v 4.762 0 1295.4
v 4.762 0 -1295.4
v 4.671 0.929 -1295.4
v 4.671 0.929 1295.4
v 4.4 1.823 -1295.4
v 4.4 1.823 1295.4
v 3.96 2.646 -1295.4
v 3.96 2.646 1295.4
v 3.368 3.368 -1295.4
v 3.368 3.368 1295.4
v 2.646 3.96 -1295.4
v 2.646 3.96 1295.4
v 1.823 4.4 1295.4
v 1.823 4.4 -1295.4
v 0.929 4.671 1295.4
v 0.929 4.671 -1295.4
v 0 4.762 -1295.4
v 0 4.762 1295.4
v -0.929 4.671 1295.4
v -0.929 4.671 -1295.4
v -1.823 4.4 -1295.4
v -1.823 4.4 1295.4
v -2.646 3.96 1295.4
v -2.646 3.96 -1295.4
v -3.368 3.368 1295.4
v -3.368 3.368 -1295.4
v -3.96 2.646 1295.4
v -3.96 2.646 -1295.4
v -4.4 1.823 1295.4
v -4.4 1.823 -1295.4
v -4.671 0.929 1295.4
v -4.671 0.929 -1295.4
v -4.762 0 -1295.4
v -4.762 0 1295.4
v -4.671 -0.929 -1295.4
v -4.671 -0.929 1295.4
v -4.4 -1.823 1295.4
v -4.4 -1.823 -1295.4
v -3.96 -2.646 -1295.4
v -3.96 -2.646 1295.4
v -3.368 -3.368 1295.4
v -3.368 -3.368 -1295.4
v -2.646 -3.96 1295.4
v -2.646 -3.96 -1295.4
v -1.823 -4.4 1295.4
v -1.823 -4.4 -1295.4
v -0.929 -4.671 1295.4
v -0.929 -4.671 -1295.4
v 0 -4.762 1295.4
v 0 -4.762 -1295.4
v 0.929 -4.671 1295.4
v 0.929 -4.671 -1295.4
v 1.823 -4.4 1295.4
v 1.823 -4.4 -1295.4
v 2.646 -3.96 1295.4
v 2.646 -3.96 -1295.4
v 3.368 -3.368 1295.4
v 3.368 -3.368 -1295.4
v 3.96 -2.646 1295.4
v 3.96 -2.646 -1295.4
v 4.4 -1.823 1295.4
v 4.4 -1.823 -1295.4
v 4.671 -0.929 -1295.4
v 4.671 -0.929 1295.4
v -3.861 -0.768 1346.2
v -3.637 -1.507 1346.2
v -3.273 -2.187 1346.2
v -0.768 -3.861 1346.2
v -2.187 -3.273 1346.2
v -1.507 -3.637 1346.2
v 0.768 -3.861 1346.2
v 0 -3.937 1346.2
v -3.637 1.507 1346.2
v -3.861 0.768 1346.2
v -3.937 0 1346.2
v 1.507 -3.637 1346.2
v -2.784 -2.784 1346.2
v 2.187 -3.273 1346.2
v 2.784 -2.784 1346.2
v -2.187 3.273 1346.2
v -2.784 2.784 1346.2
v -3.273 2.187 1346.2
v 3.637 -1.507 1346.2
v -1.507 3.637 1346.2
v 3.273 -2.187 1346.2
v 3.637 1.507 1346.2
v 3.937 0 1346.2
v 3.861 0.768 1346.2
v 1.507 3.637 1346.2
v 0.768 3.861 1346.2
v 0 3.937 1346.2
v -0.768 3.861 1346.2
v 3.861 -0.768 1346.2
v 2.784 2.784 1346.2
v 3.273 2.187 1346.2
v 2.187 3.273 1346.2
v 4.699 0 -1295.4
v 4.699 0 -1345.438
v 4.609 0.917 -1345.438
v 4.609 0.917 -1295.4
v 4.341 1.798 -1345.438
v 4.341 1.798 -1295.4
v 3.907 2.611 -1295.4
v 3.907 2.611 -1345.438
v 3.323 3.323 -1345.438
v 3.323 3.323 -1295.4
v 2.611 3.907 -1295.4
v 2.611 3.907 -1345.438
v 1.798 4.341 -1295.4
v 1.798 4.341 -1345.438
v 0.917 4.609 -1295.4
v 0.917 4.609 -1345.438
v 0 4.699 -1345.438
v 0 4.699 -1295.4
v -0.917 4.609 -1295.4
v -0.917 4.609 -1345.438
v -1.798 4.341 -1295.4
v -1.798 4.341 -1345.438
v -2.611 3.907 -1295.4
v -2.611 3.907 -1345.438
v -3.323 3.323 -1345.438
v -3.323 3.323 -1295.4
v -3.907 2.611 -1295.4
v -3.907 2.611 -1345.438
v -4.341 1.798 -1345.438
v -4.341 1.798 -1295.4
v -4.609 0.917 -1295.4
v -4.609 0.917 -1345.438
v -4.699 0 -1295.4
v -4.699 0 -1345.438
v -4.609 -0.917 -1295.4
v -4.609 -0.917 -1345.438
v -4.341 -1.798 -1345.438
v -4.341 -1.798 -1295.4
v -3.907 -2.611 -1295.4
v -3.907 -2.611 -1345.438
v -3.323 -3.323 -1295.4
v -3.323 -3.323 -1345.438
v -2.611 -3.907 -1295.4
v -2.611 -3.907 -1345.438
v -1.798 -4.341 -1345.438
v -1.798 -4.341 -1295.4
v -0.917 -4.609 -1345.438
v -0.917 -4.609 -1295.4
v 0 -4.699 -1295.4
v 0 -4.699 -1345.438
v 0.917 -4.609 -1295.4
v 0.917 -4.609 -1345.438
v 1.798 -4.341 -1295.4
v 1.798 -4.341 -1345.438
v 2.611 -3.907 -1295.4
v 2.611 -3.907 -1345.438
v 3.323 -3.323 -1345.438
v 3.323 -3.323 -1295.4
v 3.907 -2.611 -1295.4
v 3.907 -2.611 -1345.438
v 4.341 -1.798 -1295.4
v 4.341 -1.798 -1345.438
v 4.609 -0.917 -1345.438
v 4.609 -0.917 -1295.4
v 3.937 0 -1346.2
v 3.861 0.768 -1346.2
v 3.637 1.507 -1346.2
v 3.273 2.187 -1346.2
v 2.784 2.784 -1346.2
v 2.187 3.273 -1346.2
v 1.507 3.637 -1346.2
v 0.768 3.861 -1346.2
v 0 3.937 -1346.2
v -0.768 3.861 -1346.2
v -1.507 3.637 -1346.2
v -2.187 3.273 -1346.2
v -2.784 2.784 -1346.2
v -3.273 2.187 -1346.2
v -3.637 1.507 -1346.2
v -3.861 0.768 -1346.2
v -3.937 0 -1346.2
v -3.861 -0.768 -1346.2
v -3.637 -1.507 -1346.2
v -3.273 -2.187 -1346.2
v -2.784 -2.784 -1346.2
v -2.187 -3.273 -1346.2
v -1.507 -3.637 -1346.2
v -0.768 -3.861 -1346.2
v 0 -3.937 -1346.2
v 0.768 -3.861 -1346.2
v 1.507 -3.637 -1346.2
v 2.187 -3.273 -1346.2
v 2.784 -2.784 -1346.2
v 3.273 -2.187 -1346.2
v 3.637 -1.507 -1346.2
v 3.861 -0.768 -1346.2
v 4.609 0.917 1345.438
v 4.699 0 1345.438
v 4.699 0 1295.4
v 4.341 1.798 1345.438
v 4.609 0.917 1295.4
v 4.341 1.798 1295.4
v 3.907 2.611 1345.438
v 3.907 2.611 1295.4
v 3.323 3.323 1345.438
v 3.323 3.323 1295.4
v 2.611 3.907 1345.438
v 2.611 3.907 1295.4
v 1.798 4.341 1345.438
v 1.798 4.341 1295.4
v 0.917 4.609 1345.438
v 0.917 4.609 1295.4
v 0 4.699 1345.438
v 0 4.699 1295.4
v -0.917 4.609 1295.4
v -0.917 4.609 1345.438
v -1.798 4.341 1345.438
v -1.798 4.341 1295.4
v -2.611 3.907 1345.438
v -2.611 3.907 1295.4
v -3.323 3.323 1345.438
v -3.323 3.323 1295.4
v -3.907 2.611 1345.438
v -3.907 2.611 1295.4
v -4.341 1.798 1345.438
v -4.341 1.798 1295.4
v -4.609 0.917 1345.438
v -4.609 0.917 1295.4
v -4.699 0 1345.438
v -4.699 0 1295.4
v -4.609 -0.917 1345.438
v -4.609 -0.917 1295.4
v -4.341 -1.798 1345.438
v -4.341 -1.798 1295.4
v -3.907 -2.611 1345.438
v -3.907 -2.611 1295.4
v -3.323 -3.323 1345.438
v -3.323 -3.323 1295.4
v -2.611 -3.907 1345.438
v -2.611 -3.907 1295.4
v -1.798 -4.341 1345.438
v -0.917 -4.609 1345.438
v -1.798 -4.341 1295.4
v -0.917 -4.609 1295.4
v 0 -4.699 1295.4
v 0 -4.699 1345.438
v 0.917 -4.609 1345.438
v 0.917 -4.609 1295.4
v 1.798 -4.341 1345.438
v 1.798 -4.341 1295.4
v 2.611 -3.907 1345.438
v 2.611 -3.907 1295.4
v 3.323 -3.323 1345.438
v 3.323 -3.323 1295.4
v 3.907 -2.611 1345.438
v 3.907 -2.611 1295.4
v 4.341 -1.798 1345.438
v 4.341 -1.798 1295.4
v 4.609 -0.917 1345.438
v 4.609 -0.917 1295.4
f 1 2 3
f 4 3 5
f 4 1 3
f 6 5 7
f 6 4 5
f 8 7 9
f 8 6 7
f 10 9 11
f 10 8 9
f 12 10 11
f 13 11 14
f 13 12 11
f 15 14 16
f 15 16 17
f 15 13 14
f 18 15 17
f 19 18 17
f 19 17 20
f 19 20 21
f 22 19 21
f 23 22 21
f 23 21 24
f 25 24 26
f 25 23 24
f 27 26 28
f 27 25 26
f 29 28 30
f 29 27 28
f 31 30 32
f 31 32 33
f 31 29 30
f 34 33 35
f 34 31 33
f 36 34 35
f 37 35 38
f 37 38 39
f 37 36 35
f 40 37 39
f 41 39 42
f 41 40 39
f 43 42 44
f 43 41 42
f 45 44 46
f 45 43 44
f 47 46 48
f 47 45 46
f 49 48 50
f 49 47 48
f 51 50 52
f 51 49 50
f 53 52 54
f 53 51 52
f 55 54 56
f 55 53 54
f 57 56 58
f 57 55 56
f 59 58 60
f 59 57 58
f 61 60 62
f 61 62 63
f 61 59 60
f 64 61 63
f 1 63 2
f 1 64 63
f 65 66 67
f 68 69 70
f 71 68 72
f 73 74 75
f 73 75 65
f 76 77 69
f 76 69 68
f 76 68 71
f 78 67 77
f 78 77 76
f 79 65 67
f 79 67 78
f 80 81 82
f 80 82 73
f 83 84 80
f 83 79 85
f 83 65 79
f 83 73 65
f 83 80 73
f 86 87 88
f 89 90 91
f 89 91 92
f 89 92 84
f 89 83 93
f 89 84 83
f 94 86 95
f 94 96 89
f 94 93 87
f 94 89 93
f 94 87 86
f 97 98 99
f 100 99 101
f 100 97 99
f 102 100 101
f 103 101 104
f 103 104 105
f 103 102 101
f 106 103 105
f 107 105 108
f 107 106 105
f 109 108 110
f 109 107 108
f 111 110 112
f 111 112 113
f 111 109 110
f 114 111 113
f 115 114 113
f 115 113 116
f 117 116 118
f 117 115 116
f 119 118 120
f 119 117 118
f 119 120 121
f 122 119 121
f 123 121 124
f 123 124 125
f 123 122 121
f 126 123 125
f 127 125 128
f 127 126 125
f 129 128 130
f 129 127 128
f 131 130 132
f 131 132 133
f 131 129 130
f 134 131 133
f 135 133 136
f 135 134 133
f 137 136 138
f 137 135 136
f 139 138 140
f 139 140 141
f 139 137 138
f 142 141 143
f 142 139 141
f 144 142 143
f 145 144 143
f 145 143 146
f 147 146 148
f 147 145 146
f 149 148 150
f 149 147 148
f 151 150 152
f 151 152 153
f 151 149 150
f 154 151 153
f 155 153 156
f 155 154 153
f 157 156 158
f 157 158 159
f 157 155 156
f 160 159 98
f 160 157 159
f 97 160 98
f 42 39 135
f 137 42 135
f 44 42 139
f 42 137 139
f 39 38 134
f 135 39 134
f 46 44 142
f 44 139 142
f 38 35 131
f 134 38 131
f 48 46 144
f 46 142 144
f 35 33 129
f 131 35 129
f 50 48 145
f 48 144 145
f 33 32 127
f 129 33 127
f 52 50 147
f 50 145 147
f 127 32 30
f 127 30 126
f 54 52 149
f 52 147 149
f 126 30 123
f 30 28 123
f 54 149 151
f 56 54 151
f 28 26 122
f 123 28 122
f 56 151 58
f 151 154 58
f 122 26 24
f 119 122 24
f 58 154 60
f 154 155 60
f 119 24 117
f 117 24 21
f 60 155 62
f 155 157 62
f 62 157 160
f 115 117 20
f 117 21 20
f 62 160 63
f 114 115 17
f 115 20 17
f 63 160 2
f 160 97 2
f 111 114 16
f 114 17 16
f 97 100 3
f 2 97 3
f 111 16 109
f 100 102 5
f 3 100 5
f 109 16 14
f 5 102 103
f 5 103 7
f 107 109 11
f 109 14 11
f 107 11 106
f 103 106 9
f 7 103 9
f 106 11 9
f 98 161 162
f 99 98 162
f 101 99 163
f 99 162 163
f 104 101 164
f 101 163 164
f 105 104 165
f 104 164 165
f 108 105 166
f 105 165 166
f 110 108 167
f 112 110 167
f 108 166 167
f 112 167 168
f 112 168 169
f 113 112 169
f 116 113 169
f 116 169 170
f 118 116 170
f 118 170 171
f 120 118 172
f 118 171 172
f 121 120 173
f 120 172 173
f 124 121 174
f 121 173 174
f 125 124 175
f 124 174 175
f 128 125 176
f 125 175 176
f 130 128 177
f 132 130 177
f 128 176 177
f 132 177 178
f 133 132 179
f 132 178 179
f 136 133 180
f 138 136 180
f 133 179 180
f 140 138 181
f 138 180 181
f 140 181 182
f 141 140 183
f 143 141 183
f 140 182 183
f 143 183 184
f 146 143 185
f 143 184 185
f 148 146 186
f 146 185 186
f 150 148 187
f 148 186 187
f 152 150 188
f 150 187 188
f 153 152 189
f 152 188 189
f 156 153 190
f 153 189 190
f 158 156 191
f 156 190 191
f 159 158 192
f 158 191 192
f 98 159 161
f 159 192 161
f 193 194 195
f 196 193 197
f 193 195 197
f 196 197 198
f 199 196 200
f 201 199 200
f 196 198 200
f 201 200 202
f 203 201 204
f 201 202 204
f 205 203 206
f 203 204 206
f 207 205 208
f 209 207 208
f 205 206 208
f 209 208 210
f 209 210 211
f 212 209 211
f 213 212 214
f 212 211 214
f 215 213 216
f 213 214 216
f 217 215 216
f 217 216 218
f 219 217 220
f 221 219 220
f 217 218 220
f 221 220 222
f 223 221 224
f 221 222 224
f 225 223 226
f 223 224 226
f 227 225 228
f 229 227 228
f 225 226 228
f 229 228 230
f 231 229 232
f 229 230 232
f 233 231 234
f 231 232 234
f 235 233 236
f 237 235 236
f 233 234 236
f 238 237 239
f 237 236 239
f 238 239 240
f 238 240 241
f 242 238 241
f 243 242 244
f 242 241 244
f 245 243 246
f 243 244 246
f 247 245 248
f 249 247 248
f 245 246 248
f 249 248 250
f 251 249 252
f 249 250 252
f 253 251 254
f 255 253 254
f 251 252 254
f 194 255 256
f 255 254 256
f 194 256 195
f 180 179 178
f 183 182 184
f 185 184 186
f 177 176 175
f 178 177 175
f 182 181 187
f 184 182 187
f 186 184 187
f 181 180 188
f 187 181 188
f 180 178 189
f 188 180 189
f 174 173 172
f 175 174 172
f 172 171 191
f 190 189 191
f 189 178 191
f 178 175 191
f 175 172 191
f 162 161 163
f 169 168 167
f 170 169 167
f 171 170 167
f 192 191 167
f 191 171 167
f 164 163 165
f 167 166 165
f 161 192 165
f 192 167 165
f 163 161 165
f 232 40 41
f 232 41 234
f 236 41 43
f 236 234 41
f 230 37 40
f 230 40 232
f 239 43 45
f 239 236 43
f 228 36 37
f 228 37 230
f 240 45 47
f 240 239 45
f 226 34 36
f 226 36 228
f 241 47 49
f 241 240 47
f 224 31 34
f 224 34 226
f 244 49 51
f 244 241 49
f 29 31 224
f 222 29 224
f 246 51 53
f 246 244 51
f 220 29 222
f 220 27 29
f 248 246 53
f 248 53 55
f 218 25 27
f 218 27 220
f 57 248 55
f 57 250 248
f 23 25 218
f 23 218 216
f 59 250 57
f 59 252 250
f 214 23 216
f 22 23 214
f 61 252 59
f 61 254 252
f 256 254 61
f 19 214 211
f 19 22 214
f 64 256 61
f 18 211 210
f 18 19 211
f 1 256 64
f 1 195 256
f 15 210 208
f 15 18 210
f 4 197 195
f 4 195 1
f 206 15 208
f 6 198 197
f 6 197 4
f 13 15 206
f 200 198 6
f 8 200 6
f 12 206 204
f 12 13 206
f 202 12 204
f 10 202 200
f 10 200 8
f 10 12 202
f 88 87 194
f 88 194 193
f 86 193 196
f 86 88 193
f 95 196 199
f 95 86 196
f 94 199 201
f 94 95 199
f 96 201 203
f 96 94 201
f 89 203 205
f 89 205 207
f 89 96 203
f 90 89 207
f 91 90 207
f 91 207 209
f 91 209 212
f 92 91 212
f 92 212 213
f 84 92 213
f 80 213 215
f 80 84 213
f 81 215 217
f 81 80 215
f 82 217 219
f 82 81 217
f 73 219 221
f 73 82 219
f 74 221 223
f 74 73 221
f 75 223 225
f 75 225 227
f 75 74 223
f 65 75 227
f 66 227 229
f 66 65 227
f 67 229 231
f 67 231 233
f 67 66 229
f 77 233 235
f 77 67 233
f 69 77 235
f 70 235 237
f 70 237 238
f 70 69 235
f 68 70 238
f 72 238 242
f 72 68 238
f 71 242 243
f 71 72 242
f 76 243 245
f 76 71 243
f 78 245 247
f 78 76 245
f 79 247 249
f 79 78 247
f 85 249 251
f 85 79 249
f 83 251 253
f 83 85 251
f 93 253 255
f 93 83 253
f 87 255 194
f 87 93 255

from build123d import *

# Parameters (mm, degrees)
F0_R     = 4.7625
F1_DEPTH = 1295.4
F2_R     = 4.699
F3_DEPTH = 50.8
F5_SIZE  = 0.762


with BuildPart() as f1:
    # F0 (on Top) → F1 (new body, symmetric)
    with BuildSketch(Plane.XY):
        Circle(F0_R)
    extrude(amount=F1_DEPTH, both=True)

    # F2 (on face) → F3 (join)
    with BuildSketch(Plane.XY.offset(1295.4)):
        Circle(F2_R)
    extrude(amount=F3_DEPTH)

    # F4: F1 across plane


with BuildPart() as f1_1:
    add(f1.part)
    add(f1.part.mirror(Plane.XY))

    # F5
    f5_edges = [f1_1.edges().sort_by_distance(p)[0] for p in [
        (-4.699, 0, 1346.2),
        (-4.699, 0, -1346.2),
    ]]
    chamfer(f5_edges, length=F5_SIZE)


solid = f1_1.part
